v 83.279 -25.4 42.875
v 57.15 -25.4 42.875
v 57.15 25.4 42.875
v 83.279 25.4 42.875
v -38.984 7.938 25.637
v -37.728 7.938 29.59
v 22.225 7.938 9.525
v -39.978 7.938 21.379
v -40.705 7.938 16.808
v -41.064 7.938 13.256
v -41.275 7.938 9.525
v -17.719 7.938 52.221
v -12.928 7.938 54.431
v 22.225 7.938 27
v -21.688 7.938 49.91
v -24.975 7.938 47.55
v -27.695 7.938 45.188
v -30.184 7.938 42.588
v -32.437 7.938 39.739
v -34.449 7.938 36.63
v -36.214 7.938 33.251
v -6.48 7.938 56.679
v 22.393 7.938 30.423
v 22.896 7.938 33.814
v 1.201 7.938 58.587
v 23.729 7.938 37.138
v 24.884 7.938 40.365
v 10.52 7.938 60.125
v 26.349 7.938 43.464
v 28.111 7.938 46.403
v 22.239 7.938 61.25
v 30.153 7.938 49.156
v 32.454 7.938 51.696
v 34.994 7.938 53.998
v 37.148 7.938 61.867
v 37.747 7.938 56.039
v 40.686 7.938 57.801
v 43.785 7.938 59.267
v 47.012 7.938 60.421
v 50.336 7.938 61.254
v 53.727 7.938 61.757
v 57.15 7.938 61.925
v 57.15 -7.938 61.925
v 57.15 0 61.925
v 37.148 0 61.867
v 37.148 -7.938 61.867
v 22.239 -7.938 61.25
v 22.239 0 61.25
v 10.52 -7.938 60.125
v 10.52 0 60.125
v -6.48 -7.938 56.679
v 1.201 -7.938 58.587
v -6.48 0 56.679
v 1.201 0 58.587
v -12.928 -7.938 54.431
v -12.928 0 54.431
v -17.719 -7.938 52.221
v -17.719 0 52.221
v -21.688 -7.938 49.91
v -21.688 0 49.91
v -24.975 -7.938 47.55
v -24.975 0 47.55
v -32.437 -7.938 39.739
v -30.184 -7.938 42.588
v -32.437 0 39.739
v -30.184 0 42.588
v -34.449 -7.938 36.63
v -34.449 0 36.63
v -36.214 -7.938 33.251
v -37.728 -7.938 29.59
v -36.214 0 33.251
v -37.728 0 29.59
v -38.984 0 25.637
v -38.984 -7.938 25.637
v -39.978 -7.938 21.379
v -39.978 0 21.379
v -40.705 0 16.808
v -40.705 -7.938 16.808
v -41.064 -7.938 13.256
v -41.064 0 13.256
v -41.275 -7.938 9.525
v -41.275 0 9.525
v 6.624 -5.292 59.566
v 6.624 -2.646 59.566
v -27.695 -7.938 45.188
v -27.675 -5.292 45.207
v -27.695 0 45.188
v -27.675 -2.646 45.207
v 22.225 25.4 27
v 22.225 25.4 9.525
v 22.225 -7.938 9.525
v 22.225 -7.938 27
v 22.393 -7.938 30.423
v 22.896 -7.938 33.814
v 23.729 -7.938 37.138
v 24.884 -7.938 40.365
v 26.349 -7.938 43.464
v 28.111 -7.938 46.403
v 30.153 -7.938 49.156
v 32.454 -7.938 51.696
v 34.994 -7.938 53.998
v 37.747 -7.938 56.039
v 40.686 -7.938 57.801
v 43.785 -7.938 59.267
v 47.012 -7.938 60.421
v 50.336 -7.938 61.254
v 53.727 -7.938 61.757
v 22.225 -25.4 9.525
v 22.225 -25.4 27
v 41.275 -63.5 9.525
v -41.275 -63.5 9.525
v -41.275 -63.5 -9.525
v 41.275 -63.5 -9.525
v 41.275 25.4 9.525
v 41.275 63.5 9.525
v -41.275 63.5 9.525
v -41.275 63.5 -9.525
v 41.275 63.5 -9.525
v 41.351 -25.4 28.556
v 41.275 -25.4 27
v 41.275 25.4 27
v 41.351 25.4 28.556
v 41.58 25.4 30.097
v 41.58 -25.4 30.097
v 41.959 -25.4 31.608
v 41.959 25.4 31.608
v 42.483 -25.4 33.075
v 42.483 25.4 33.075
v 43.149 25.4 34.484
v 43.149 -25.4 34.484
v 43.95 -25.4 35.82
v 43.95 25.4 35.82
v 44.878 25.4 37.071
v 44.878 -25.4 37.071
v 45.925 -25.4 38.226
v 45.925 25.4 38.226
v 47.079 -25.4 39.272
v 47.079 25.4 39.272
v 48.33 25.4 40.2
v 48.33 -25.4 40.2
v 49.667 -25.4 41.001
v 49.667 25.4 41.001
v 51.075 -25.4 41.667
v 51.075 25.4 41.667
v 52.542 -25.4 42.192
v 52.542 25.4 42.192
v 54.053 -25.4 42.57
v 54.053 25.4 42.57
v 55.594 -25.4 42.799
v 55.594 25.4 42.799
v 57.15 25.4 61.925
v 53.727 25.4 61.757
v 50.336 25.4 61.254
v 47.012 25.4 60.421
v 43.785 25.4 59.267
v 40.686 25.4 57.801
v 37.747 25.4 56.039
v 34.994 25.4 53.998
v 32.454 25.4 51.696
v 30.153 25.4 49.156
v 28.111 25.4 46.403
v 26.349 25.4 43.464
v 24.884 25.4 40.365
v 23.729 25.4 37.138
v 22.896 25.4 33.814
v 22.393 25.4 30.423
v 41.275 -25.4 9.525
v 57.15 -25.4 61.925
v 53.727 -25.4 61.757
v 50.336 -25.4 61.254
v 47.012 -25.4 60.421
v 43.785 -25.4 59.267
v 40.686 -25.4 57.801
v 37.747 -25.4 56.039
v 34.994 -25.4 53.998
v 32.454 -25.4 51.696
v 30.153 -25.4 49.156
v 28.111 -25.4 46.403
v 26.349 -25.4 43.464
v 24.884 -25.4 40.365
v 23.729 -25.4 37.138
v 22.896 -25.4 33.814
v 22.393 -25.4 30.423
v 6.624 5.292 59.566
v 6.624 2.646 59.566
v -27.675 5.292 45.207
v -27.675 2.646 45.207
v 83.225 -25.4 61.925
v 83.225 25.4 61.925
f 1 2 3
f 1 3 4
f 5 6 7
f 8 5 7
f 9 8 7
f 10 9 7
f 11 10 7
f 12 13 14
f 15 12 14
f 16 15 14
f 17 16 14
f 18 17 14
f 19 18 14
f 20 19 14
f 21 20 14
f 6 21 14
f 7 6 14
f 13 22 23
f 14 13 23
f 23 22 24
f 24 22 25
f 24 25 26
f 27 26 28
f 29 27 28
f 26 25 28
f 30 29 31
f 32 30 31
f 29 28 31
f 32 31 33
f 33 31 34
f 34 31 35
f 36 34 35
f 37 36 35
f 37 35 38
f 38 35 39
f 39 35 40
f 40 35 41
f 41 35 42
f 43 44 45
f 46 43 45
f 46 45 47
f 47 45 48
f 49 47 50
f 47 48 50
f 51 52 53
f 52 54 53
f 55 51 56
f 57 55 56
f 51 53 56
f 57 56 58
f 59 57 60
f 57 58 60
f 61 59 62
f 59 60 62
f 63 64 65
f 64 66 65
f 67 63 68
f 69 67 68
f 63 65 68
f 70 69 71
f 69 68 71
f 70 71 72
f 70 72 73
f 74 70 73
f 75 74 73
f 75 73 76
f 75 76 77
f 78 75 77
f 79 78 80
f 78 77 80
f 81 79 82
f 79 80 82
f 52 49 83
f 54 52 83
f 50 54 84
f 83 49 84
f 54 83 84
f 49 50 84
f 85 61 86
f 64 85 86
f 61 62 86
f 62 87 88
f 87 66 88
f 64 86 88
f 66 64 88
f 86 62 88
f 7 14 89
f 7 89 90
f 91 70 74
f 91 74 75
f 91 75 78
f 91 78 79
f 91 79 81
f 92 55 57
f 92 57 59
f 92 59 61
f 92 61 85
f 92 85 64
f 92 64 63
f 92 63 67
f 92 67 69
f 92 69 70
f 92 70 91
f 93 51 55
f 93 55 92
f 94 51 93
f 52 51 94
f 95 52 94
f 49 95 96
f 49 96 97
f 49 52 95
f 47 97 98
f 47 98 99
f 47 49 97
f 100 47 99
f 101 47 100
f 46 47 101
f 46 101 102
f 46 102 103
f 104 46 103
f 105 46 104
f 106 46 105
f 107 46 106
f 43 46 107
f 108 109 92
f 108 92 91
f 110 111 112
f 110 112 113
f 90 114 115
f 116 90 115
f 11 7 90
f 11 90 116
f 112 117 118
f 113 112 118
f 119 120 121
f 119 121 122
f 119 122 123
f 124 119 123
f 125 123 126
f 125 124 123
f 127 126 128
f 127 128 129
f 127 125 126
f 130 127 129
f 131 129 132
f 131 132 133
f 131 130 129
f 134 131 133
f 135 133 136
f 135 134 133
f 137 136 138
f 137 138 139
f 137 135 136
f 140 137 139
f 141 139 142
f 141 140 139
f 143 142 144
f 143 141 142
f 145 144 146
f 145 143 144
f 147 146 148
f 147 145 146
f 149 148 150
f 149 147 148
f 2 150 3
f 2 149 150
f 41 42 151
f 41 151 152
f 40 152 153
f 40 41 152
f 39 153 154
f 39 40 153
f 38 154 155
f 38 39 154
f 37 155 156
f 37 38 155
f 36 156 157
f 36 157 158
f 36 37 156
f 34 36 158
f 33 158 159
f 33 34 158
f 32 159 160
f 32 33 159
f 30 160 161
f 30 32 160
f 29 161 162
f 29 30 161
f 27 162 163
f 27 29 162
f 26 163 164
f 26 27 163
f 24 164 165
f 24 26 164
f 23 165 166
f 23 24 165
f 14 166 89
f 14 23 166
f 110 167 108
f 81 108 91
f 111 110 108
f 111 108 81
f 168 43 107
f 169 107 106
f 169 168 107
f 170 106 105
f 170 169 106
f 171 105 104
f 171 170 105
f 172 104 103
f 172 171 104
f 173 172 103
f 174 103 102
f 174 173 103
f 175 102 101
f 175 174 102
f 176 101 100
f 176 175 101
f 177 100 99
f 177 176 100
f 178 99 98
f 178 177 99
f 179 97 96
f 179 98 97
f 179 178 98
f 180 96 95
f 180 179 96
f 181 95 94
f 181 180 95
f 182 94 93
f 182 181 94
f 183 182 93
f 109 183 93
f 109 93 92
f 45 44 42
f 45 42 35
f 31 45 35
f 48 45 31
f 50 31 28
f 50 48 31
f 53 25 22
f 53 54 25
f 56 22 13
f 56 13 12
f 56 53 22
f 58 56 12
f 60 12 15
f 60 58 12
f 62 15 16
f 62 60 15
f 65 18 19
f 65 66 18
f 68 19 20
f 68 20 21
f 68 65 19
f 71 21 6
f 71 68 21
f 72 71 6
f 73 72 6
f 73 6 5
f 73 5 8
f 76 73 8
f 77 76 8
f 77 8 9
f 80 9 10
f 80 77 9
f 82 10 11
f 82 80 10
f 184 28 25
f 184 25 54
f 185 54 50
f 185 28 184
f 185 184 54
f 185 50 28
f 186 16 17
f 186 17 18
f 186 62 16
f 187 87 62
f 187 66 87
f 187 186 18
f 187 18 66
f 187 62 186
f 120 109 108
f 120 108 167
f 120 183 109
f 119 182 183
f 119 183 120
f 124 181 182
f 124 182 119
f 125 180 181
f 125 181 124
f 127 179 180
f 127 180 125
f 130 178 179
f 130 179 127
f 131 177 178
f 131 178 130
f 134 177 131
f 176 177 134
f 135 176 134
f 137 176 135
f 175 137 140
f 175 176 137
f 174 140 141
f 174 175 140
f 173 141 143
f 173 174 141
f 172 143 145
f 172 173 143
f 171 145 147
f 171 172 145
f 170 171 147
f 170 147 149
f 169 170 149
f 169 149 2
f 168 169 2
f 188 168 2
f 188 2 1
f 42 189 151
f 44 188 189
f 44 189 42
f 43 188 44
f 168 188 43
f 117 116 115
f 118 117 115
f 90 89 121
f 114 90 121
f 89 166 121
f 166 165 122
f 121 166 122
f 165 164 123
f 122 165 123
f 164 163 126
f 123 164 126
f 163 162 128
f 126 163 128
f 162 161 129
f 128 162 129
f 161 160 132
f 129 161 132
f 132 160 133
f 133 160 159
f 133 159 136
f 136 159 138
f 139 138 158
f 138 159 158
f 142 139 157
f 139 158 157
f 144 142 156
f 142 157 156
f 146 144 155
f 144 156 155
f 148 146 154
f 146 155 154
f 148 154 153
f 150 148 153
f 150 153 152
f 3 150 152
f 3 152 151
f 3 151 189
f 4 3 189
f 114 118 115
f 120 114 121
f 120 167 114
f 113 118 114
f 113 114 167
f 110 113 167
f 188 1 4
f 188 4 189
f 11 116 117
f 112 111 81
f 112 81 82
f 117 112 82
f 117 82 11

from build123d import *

# Parameters (mm, degrees)
F1_DEPTH = 63.5
F2_DEPTH = 25.4
F3_DEPTH = 7.9375


with BuildPart() as f1:
    # F0 (on Front) → F1 (new body, symmetric)
    with BuildSketch(Plane.XZ):
        Polygon((22.225, 9.525), (-41.275, 9.525), (-41.275, -9.525), (41.275, -9.525), (41.275, 9.525), align=None)
    extrude(amount=F1_DEPTH, both=True)

    # F0 (on Front) → F2 (join, symmetric)
    with BuildSketch(Plane.XZ):
        with BuildLine():
            Line((22.225, 27.0002), (22.225, 9.525))
            Line((22.225, 9.525), (41.275, 9.525))
            Line((41.275, 9.525), (41.275, 27.0002))
            ThreePointArc((41.275, 27.0002), (45.9246798487, 38.2255201513), (57.15, 42.8752))
            Line((57.15, 42.8752), (60.325, 42.8752))
            Line((60.325, 42.8752), (60.325, 61.9252))
            Line((60.325, 61.9252), (57.15, 61.9252))
            ThreePointArc((57.15, 61.9252), (32.4542956671, 51.6959043329), (22.225, 27.0002))
        make_face()
        Polygon((83.2245436112, 61.9252), (60.325, 61.9252), (60.325, 42.8752), (83.2786646287, 42.8752), align=None)
    extrude(amount=F2_DEPTH, both=True)

    # F0 (on Front) → F3 (join, symmetric)
    with BuildSketch(Plane.XZ):
        with BuildLine():
            add(Edge.make_bspline(
                [(57.15, 61.9252), (0, 62.4593123794), (-39.5135097206, 58.9755401015), (-41.275, 9.525)],
                knots=[0, 0, 0, 0, 111.5045361635, 111.5045361635, 111.5045361635, 111.5045361635], degree=3))
            Line((-41.275, 9.525), (22.225, 9.525))
            Line((22.225, 9.525), (22.225, 27.0002))
            ThreePointArc((22.225, 27.0002), (32.4542956671, 51.6959043329), (57.15, 61.9252))
        make_face()
    extrude(amount=F3_DEPTH, both=True)


solid = f1.part
